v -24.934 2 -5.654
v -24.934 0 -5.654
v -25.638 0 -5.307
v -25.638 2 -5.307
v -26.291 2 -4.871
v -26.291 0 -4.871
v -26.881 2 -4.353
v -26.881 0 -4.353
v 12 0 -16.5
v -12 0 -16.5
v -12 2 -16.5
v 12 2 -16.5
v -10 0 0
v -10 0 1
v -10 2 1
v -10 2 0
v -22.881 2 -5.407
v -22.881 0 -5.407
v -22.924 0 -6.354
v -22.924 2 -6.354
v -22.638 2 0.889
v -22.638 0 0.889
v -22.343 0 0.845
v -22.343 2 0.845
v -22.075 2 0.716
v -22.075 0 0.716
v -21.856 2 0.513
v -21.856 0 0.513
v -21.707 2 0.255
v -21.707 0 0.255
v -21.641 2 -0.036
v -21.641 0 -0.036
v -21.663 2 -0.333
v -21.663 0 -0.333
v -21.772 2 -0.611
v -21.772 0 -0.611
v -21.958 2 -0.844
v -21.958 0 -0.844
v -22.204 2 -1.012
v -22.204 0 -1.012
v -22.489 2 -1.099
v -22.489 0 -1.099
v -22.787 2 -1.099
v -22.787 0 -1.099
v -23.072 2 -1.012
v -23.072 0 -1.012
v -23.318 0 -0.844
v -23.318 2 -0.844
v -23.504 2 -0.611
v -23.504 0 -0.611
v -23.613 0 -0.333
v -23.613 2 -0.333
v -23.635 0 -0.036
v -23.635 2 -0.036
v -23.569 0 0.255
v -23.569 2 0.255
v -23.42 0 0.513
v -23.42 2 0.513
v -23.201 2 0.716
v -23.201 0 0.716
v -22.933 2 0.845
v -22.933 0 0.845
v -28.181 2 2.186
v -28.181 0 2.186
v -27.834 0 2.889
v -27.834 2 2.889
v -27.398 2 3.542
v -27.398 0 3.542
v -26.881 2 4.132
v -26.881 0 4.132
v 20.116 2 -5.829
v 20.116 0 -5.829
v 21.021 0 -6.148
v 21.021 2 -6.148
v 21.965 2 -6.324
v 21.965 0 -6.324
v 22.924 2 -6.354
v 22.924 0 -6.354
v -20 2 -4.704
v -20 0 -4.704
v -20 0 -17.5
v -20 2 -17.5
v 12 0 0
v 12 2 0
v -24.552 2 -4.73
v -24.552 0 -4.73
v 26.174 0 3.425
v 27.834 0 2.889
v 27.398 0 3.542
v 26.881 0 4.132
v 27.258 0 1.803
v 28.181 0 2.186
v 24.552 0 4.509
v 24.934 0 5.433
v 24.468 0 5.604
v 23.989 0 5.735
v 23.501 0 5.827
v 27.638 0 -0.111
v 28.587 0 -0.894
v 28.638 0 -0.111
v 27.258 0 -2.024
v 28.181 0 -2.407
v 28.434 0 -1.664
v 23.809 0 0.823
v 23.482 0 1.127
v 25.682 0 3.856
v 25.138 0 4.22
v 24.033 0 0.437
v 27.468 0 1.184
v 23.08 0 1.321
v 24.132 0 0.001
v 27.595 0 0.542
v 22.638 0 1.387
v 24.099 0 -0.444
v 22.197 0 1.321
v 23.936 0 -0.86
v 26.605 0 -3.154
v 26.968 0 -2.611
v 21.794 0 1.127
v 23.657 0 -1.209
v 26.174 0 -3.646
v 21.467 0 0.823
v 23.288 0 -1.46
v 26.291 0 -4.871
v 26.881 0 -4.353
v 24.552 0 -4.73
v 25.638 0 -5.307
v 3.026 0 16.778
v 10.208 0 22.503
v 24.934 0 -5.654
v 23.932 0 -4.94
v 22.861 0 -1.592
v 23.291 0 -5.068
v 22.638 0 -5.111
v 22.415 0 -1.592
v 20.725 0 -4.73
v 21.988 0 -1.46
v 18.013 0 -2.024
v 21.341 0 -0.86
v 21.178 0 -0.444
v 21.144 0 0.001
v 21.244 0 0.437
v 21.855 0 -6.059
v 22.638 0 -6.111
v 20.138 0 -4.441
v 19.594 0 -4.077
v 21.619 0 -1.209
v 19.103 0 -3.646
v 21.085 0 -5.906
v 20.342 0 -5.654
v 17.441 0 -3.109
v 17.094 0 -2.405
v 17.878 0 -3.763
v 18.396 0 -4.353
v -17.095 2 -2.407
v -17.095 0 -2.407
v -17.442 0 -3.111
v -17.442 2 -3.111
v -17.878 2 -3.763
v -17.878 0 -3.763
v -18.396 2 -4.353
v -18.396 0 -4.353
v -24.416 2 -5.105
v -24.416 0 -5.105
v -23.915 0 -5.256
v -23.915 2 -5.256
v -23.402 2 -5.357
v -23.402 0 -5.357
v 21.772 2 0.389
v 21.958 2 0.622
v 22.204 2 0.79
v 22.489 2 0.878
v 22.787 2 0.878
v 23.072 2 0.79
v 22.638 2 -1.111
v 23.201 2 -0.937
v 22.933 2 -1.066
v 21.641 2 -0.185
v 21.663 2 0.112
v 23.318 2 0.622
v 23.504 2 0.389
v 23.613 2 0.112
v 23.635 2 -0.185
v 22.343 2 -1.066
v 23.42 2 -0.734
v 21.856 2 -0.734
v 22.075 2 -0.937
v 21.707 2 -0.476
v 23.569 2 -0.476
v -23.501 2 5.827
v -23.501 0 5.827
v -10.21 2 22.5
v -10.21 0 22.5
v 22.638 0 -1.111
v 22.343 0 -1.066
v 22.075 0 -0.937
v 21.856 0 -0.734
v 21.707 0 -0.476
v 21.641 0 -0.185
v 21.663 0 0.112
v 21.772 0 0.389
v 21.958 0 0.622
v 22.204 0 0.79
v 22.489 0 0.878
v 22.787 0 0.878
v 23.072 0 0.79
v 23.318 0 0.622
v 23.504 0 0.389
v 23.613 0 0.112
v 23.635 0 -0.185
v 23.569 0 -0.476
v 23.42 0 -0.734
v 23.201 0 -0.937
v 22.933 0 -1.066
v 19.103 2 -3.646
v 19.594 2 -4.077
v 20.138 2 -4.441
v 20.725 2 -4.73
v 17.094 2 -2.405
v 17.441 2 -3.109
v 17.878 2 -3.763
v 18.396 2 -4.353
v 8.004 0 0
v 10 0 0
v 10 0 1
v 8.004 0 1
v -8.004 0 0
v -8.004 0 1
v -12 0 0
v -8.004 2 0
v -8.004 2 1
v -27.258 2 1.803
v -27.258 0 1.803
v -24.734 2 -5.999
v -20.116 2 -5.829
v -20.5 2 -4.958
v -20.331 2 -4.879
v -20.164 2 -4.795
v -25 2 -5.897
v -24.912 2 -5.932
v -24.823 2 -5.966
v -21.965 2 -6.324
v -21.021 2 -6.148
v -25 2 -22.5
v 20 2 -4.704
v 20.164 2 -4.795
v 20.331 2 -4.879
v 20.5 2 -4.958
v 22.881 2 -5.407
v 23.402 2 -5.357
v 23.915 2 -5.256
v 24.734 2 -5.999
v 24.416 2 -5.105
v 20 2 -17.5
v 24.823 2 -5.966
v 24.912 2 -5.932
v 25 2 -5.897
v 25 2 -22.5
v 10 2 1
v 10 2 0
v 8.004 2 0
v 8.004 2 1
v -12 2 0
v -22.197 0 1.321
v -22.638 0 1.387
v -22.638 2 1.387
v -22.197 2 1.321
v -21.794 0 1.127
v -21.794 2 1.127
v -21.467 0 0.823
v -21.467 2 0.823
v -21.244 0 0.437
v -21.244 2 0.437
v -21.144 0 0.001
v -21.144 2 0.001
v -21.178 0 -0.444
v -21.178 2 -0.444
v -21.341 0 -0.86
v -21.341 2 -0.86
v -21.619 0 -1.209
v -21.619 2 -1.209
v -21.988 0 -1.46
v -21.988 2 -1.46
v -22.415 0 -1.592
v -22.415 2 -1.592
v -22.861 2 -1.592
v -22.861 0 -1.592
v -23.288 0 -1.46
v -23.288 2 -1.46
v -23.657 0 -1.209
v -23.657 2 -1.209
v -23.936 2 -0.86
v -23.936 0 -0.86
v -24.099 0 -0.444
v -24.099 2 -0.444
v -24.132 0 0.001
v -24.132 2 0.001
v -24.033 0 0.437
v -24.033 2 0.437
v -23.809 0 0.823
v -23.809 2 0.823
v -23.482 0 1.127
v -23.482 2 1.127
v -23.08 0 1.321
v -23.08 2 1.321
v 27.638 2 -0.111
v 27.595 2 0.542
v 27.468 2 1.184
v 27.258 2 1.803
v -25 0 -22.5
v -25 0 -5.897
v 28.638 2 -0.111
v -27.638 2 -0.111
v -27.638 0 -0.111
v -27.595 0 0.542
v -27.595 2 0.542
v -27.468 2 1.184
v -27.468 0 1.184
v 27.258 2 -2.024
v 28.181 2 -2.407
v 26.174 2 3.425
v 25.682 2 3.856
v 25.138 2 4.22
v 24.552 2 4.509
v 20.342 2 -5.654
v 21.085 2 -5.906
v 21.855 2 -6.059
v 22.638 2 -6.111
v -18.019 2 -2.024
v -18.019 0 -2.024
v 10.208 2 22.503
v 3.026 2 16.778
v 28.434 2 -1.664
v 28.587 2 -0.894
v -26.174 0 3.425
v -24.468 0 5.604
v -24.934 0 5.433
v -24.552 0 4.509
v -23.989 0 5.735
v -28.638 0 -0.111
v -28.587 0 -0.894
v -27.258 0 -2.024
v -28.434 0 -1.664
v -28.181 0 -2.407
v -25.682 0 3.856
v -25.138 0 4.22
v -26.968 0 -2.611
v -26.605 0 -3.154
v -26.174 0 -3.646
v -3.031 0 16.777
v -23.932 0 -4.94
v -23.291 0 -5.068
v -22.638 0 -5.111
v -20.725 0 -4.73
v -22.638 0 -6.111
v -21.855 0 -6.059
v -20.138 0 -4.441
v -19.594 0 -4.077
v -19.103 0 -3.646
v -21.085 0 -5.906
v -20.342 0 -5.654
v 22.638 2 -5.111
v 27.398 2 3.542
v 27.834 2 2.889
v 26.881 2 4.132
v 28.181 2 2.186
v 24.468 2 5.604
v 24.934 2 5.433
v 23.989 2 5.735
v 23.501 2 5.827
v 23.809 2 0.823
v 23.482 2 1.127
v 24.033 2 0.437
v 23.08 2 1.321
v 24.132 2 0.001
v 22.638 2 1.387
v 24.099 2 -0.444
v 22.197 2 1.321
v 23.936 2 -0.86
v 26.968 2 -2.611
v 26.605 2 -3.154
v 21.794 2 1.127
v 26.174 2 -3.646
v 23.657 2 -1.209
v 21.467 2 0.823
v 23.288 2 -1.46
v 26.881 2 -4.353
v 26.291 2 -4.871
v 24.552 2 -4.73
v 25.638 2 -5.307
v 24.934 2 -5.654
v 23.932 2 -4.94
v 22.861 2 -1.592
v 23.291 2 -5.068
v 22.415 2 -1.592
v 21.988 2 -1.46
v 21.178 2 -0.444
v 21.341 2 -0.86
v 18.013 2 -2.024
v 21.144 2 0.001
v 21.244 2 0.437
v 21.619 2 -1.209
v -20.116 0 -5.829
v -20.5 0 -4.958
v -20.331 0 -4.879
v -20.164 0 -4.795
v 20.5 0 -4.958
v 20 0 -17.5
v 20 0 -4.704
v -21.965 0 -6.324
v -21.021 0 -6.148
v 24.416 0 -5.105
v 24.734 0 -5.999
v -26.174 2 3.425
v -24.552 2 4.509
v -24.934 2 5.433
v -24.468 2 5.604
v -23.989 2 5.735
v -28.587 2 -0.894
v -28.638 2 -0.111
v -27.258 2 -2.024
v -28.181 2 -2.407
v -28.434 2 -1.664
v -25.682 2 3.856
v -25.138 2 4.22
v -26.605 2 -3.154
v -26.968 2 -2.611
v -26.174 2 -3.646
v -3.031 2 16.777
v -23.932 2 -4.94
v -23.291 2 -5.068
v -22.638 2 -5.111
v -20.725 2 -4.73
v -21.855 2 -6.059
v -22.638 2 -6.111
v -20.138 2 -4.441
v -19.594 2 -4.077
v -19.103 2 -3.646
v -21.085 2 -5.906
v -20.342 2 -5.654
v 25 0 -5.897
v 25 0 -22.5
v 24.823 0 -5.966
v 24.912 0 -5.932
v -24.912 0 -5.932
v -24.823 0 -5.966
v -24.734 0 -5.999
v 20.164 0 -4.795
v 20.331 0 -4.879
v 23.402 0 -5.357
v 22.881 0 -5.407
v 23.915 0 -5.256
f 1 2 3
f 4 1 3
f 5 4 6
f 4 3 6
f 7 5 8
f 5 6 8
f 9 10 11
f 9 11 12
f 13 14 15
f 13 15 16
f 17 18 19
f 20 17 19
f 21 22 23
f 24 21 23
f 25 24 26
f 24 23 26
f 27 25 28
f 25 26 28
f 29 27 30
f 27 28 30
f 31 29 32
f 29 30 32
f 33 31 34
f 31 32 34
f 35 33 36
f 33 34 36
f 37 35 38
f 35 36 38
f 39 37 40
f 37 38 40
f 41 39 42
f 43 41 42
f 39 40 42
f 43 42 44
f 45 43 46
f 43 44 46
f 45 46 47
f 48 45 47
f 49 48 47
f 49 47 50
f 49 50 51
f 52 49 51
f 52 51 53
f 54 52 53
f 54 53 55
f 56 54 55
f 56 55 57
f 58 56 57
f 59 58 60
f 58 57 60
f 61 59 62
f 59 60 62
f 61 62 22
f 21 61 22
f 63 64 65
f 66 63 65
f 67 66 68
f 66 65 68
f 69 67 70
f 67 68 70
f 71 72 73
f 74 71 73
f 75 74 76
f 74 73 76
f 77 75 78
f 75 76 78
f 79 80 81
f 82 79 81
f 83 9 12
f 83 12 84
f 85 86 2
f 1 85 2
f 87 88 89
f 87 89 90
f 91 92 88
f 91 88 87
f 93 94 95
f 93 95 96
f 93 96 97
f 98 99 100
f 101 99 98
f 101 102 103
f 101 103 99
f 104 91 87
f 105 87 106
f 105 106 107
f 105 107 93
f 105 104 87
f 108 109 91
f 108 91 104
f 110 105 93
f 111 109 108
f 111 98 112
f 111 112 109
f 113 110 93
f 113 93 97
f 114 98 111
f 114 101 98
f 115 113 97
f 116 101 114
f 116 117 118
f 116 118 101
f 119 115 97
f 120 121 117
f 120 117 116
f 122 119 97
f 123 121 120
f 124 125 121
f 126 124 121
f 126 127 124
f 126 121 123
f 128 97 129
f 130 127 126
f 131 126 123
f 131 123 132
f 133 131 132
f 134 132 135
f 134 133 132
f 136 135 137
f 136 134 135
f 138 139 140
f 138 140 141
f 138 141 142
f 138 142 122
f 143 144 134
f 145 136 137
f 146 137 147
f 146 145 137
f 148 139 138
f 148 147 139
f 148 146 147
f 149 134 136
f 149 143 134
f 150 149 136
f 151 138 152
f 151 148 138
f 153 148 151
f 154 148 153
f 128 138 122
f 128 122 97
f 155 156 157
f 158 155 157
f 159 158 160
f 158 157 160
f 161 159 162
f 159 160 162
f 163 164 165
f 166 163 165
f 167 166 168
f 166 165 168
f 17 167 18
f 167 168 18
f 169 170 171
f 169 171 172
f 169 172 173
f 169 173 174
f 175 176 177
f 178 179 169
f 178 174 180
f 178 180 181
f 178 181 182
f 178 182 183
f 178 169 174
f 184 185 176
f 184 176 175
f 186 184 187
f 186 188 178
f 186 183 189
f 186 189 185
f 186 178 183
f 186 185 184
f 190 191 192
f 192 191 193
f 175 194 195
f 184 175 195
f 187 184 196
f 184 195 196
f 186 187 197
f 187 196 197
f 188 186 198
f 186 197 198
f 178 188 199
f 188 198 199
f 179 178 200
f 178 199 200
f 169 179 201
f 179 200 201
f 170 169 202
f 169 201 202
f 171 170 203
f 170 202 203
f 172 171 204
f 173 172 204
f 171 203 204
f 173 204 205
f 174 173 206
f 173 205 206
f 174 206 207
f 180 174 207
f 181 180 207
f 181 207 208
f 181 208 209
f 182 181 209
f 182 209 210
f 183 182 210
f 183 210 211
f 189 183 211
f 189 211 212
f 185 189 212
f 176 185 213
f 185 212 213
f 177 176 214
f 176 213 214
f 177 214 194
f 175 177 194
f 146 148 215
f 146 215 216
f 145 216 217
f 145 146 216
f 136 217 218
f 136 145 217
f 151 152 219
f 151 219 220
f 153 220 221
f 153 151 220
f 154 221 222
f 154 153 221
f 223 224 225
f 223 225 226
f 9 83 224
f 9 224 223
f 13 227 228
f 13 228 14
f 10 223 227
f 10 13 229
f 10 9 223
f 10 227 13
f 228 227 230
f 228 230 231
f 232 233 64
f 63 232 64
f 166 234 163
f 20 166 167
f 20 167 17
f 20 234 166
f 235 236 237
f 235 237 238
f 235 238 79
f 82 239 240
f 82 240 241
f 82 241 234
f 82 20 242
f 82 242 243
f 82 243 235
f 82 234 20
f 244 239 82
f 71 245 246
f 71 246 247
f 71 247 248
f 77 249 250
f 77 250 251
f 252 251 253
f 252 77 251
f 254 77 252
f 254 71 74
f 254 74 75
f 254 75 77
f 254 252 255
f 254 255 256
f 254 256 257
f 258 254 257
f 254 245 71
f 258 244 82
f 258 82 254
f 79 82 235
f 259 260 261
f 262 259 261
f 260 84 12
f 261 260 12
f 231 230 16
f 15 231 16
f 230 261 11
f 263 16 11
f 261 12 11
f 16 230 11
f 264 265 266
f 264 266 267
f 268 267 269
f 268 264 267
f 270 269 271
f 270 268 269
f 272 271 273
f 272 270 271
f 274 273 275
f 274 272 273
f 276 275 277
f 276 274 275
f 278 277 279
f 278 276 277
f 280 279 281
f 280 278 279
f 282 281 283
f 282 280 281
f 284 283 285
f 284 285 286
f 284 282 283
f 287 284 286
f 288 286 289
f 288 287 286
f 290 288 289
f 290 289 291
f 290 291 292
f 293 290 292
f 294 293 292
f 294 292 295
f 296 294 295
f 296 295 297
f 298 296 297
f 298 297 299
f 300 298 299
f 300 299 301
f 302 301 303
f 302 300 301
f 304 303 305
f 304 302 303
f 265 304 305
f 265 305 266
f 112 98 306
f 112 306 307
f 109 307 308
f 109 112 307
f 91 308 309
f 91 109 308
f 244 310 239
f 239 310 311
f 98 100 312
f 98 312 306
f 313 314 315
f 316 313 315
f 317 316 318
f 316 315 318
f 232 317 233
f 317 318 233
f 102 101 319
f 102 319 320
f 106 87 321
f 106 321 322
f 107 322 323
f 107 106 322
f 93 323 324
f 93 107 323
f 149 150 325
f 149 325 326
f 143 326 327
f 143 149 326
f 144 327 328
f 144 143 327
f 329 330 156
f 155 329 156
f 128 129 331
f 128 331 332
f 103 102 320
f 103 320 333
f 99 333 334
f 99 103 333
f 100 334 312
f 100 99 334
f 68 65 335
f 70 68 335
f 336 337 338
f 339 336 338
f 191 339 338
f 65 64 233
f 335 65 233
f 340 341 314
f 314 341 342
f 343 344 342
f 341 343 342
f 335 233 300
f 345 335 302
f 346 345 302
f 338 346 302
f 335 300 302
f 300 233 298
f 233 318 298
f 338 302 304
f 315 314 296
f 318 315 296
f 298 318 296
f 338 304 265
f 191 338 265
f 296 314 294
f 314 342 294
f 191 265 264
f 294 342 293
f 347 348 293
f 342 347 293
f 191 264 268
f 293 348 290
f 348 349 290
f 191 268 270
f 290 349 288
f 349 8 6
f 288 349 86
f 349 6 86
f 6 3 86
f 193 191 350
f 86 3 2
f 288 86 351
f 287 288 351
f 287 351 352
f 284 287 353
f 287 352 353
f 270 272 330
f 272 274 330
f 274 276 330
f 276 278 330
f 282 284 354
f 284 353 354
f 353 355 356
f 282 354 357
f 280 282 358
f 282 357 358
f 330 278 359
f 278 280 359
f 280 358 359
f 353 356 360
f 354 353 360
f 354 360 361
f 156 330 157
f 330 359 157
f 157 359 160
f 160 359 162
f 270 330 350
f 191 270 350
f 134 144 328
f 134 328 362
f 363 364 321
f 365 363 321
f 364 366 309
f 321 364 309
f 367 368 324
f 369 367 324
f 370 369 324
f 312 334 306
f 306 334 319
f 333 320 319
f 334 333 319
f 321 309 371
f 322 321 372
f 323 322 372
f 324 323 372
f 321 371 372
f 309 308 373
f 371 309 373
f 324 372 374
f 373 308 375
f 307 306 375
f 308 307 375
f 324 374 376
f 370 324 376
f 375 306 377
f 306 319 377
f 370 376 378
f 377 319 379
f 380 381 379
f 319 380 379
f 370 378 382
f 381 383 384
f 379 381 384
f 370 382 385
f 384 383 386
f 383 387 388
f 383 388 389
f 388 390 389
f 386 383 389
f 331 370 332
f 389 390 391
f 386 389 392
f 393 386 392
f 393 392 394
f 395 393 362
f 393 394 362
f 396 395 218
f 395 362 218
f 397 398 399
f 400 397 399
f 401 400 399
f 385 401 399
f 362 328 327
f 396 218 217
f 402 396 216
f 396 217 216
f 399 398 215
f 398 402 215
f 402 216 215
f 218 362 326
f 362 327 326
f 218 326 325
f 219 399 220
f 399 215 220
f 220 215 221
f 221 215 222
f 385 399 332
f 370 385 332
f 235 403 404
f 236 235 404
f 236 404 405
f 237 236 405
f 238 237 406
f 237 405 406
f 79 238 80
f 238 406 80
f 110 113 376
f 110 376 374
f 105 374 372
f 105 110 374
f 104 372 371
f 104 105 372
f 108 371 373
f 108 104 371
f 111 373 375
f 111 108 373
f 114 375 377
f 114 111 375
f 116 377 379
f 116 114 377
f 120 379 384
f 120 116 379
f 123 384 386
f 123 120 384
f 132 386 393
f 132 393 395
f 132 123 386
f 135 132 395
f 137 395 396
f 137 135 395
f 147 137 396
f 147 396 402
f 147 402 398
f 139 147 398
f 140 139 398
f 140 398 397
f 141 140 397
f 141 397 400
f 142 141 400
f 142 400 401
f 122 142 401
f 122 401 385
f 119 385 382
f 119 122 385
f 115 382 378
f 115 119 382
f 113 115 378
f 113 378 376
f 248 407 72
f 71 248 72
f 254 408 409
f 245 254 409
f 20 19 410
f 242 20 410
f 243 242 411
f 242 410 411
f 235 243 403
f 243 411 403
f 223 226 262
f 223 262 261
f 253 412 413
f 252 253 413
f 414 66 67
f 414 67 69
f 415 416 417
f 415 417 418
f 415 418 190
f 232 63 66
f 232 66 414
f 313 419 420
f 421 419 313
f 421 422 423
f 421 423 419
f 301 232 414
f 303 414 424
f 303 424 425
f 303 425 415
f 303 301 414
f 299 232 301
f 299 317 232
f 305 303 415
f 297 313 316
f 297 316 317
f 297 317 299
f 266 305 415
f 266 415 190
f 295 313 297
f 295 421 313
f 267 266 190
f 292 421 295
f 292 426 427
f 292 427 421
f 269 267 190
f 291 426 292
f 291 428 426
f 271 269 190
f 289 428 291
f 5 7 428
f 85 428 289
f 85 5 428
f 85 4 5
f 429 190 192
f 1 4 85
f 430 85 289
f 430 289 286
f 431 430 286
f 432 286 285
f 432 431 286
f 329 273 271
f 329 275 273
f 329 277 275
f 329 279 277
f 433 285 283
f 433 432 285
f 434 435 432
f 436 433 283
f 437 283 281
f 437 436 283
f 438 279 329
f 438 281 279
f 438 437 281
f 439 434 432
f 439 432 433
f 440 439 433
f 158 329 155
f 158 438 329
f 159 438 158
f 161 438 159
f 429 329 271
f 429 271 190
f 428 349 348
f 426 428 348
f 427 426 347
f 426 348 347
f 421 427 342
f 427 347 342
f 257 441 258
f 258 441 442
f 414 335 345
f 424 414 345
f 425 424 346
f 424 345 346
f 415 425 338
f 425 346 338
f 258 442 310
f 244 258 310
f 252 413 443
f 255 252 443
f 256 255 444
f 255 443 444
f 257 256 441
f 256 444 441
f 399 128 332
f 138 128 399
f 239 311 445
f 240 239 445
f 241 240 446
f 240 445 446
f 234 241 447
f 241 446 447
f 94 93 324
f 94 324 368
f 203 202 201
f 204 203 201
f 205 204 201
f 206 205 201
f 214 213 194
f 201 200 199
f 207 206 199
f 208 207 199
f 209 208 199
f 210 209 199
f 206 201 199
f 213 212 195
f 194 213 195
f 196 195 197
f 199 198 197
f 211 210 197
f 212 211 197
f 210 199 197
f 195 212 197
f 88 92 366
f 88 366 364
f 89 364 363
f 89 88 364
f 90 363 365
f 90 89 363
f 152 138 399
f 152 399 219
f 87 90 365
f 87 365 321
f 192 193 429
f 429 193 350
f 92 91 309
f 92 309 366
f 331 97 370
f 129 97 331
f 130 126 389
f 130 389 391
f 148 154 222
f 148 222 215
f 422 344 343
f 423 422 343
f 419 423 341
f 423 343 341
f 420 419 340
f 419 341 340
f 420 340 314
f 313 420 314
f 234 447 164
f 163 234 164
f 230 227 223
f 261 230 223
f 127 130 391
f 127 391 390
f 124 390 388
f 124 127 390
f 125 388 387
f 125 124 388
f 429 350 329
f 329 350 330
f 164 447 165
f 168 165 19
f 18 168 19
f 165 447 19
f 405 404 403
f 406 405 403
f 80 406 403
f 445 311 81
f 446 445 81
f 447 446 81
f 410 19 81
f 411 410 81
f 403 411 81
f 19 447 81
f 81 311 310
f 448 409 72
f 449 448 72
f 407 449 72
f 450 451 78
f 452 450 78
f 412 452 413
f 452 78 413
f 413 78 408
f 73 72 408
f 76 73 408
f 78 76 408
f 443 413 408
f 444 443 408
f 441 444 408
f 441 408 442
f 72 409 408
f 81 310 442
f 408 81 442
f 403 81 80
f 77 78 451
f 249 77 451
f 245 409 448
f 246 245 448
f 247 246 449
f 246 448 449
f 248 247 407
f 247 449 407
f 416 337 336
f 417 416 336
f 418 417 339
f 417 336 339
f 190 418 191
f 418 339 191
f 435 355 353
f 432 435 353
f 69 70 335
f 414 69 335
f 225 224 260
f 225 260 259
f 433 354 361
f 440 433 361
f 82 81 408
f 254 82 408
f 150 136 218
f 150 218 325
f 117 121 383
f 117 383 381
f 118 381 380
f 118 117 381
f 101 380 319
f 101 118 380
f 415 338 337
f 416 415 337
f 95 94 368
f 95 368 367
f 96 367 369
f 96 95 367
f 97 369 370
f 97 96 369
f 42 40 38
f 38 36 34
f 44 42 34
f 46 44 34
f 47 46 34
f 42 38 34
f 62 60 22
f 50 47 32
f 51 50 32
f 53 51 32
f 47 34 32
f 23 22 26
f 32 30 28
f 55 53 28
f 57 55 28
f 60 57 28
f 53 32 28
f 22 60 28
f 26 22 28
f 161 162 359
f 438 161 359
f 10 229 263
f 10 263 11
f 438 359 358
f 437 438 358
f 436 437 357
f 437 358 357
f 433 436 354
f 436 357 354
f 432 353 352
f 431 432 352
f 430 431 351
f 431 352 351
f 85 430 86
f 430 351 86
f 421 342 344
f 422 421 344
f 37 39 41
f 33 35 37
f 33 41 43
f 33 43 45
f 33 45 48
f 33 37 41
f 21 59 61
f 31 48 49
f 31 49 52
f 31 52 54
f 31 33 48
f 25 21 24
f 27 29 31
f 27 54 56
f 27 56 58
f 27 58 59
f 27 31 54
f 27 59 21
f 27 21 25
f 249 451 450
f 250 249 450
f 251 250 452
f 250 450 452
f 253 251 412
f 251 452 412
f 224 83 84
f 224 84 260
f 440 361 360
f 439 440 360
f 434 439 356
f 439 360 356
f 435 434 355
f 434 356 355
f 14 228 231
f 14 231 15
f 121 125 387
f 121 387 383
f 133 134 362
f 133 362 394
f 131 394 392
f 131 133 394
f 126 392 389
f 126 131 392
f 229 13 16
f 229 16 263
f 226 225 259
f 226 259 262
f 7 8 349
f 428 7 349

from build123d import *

# Parameters (mm, degrees)
SKETCH1_R             = 1.498045306
BOSS_EXTRUDE2_DEPTH   = 2
BOSS_EXTRUDE2_2_DEPTH = 2
BOSS_EXTRUDE2_3_DEPTH = 2
BOSS_EXTRUDE2_4_DEPTH = 2
SKETCH2_R             = 1
BOSS_EXTRUDE4_DEPTH   = 2
BOSS_EXTRUDE4_2_DEPTH = 2


with BuildPart() as part:
    # Sketch1 → Boss-Extrude2 (new body)
    with BuildSketch(Plane(origin=(0, 0, 0), x_dir=(1, 0, 0), z_dir=(0, 1, 0))):
        with BuildLine():
            ThreePointArc((24.93426242, -5.432691005), (24.22975243, -5.674466908), (23.500714707, -5.827090336))
            Line((23.500714707, -5.827090336), (10.20772594, -22.502760482))
            Line((10.20772594, -22.502760482), (3.025571641, -16.777515525))
            Line((3.025571641, -16.777515525), (18.013147942, 2.023965696))
            Line((18.013147942, 2.023965696), (17.094049208, 2.404668857))
            ThreePointArc((17.094049208, 2.404668857), (17.648737545, 3.443099558), (18.395521139, 4.353226878))
            Line((18.395521139, 4.353226878), (19.10262792, 3.646120096))
            ThreePointArc((19.10262792, 3.646120096), (19.860310661, 4.267934252), (20.724744664, 4.729983853))
            Line((20.724744664, 4.729983853), (20.342061232, 5.653863385))
            ThreePointArc((20.342061232, 5.653863385), (21.467619894, 5.995297873), (22.638161826, 6.11058619))
            Line((22.638161826, 6.11058619), (22.638161826, 5.11058619))
            ThreePointArc((22.638161826, 5.11058619), (23.613613436, 5.014512592), (24.551578988, 4.729983853))
            Line((24.551578988, 4.729983853), (24.93426242, 5.653863385))
            ThreePointArc((24.93426242, 5.653863385), (25.971583224, 5.099403864), (26.880802513, 4.353226878))
            Line((26.880802513, 4.353226878), (26.173695732, 3.646120096))
            ThreePointArc((26.173695732, 3.646120096), (26.795509888, 2.888437355), (27.257559489, 2.024003352))
            Line((27.257559489, 2.024003352), (28.181439021, 2.406686785))
            ThreePointArc((28.181439021, 2.406686785), (28.522873509, 1.281128122), (28.638161826, 0.11058619))
            Line((28.638161826, 0.11058619), (27.638161826, 0.11058619))
            ThreePointArc((27.638161826, 0.11058619), (27.542088228, -0.86486542), (27.257559489, -1.802830971))
            Line((27.257559489, -1.802830971), (28.181439021, -2.185514404))
            ThreePointArc((28.181439021, -2.185514404), (27.6269795, -3.222835208), (26.880802513, -4.132054497))
            Line((26.880802513, -4.132054497), (26.173695732, -3.424947716))
            ThreePointArc((26.173695732, -3.424947716), (25.416012991, -4.046761871), (24.551578988, -4.508811472))
            Line((24.551578988, -4.508811472), (24.93426242, -5.432691005))
        make_face()
        with Locations(Location((22.638161826, 0.11058619, 0), (0, 0, 270))):
            Circle(SKETCH1_R, mode=Mode.SUBTRACT)
    extrude(amount=BOSS_EXTRUDE2_DEPTH)


with BuildPart() as body_2:
    # Sketch1 → Boss-Extrude2 2 (new body)
    with BuildSketch(Plane(origin=(0, 0, 0), x_dir=(1, 0, 0), z_dir=(0, 1, 0))):
        with BuildLine():
            Line((-28.638161826, 0.11058619), (-27.638161826, 0.11058619))
            ThreePointArc((-27.638161826, 0.11058619), (-27.542088228, -0.86486542), (-27.257559489, -1.802830971))
            Line((-27.257559489, -1.802830971), (-28.181439021, -2.185514404))
            ThreePointArc((-28.181439021, -2.185514404), (-27.6269795, -3.222835208), (-26.880802513, -4.132054497))
            Line((-26.880802513, -4.132054497), (-26.173695732, -3.424947716))
            ThreePointArc((-26.173695732, -3.424947716), (-25.416012991, -4.046761871), (-24.551578988, -4.508811472))
            Line((-24.551578988, -4.508811472), (-24.93426242, -5.432691005))
            ThreePointArc((-24.93426242, -5.432691005), (-24.22975243, -5.674466908), (-23.500714707, -5.827090336))
            Line((-23.500714707, -5.827090336), (-10.209926455, -22.5))
            Line((-10.209926455, -22.5), (-3.031187863, -16.777477869))
            Line((-3.031187863, -16.777477869), (-18.018764164, 2.024003352))
            Line((-18.018764164, 2.024003352), (-17.094884631, 2.406686785))
            ThreePointArc((-17.094884631, 2.406686785), (-17.649344152, 3.444007589), (-18.395521139, 4.353226878))
            Line((-18.395521139, 4.353226878), (-19.10262792, 3.646120096))
            ThreePointArc((-19.10262792, 3.646120096), (-19.860310661, 4.267934252), (-20.724744664, 4.729983853))
            Line((-20.724744664, 4.729983853), (-20.342061232, 5.653863385))
            ThreePointArc((-20.342061232, 5.653863385), (-21.467619894, 5.995297873), (-22.638161826, 6.11058619))
            Line((-22.638161826, 6.11058619), (-22.638161826, 5.11058619))
            ThreePointArc((-22.638161826, 5.11058619), (-23.613613436, 5.014512592), (-24.551578988, 4.729983853))
            Line((-24.551578988, 4.729983853), (-24.93426242, 5.653863385))
            ThreePointArc((-24.93426242, 5.653863385), (-25.971583224, 5.099403864), (-26.880802513, 4.353226878))
            Line((-26.880802513, 4.353226878), (-26.173695732, 3.646120096))
            ThreePointArc((-26.173695732, 3.646120096), (-26.795509888, 2.888437355), (-27.257559489, 2.024003352))
            Line((-27.257559489, 2.024003352), (-28.181439021, 2.406686785))
            ThreePointArc((-28.181439021, 2.406686785), (-28.522873509, 1.281128122), (-28.638161826, 0.11058619))
        make_face()
        with Locations(Location((-22.638161826, 0.11058619, 0), (0, 0, 270))):
            Circle(SKETCH1_R, mode=Mode.SUBTRACT)
    extrude(amount=BOSS_EXTRUDE2_2_DEPTH)


with BuildPart() as body_3:
    # Sketch1 → Boss-Extrude2 3 (new body)
    with BuildSketch(Plane(origin=(0, 0, 0), x_dir=(1, 0, 0), z_dir=(0, 1, 0))):
        Polygon((10, 0), (10, -1), (8.003694636, -1), (8.003694636, 0), (0, 0), (-8.003694636, 0), (-8.003694636, -1), (-10, -1), (-10, 0), (-12, 0), (-12, 16.5), (12, 16.5), (12, 0), align=None)
    extrude(amount=BOSS_EXTRUDE2_3_DEPTH)


with BuildPart() as body_4:
    # Sketch1 → Boss-Extrude2 4 (new body)
    with BuildSketch(Plane(origin=(0, 0, 0), x_dir=(1, 0, 0), z_dir=(0, 1, 0))):
        with BuildLine():
            Line((20, 17.5), (20, 4.704387934))
            ThreePointArc((20, 4.704387934), (20.246889772, 4.837607477), (20.500485829, 4.957570161))
            Line((20.500485829, 4.957570161), (20.116101161, 5.829127088))
            ThreePointArc((20.116101161, 5.829127088), (21.489621214, 6.254148224), (22.923922413, 6.354050044))
            Line((22.923922413, 6.354050044), (22.880572318, 5.406911915))
            ThreePointArc((22.880572318, 5.406911915), (23.659669367, 5.31311936), (24.416388714, 5.105357273))
            Line((24.416388714, 5.105357273), (24.734387752, 5.998568601))
            ThreePointArc((24.734387752, 5.998568601), (24.867770705, 5.949365536), (25, 5.897141335))
            Line((25, 5.897141335), (25, 22.5))
            Line((25, 22.5), (-25, 22.5))
            Line((-25, 22.5), (-25, 5.897141335))
            ThreePointArc((-25, 5.897141335), (-24.867770705, 5.949365536), (-24.734387752, 5.998568601))
            Line((-24.734387752, 5.998568601), (-24.416388714, 5.105357273))
            ThreePointArc((-24.416388714, 5.105357273), (-23.659669367, 5.31311936), (-22.880572318, 5.406911915))
            Line((-22.880572318, 5.406911915), (-22.923922413, 6.354050044))
            ThreePointArc((-22.923922413, 6.354050044), (-21.489621214, 6.254148224), (-20.116101161, 5.829127088))
            Line((-20.116101161, 5.829127088), (-20.500485829, 4.957570161))
            ThreePointArc((-20.500485829, 4.957570161), (-20.246889772, 4.837607477), (-20, 4.704387934))
            Line((-20, 4.704387934), (-20, 17.5))
            Line((-20, 17.5), (20, 17.5))
        make_face()
    extrude(amount=BOSS_EXTRUDE2_4_DEPTH)


with BuildPart() as body_5:
    # Sketch2 → Boss-Extrude4 (new body)
    with BuildSketch(Plane(origin=(0, 0, 0), x_dir=(1, 0, 0), z_dir=(0, 1, 0))):
        with Locations(Location((22.638161826, 0.11058619, 0), (0, 0, 90))):
            Circle(SKETCH2_R)
    extrude(amount=BOSS_EXTRUDE4_DEPTH)


with BuildPart() as body_6:
    # Sketch2 → Boss-Extrude4 2 (new body)
    with BuildSketch(Plane(origin=(0, 0, 0), x_dir=(1, 0, 0), z_dir=(0, 1, 0))):
        with Locations(Location((-22.638161826, 0.11058619, 0), (0, 0, 270))):
            Circle(SKETCH2_R)
    extrude(amount=BOSS_EXTRUDE4_2_DEPTH)


solid = Compound([part.part, body_2.part, body_3.part, body_4.part, body_5.part, body_6.part])
